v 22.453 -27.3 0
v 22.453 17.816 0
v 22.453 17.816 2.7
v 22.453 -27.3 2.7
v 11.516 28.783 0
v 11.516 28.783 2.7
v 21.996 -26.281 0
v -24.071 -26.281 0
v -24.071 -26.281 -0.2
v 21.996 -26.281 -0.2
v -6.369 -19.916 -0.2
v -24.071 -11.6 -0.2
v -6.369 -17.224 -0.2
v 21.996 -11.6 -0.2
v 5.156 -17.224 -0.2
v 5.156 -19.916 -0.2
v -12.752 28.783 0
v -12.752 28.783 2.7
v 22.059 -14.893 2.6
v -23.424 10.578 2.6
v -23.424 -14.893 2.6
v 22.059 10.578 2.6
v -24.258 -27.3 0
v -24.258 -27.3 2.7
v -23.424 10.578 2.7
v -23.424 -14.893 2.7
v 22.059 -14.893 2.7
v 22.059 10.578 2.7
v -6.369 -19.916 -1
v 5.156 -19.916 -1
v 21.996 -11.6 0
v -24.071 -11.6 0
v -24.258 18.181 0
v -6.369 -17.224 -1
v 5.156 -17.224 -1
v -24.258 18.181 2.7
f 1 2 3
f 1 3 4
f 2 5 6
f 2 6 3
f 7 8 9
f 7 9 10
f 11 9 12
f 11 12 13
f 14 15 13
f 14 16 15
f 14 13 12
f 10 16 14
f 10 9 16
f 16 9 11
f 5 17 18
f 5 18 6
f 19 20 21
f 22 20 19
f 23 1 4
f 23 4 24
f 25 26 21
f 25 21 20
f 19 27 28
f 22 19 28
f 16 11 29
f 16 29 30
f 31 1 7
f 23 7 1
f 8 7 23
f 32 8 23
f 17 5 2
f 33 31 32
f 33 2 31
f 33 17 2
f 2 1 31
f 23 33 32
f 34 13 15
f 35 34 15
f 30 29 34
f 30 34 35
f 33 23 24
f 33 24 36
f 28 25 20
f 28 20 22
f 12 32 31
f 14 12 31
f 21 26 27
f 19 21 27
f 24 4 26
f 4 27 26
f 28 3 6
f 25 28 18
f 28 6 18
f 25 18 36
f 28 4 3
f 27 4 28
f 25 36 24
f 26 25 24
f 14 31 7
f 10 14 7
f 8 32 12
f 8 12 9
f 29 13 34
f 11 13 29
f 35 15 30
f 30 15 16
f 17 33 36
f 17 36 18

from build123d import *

# Parameters (mm, degrees)
PAD023_DEPTH    = 2.7
SKETCH025_W     = 45.482226
SKETCH025_H     = 25.470864
POCKET004_DEPTH = 0.1
SKETCH026_W     = 11.525024
SKETCH026_H     = 2.6917
PAD024_DEPTH    = 1
SKETCH027_W     = 46.067685
SKETCH027_H     = 14.680909
PAD025_DEPTH    = 0.2


with BuildPart() as part:
    # Sketch024 → Pad023 (new body)
    with BuildSketch(Plane.XY):
        Polygon((-12.752221, 28.783382), (11.516397, 28.783382), (22.453339, 17.81637), (22.453339, -27.300421), (-24.258354, -27.300421), (-24.258354, 18.181068), align=None)
    extrude(amount=PAD023_DEPTH)

    # Sketch025 (on Face8 of Pad023) → Pocket004 (cut)
    with BuildSketch(Plane.XY.offset(2.7)):
        with Locations((-0.682435, -2.157326)):
            Rectangle(SKETCH025_W, SKETCH025_H)
    extrude(amount=-POCKET004_DEPTH, mode=Mode.SUBTRACT)

    # Sketch026 (on Face4 of Pocket004) → Pad024 (join)
    with BuildSketch(Plane(origin=(0, 0, 0), x_dir=(1, 0, 0), z_dir=(0, 0, -1))):
        with Locations((-0.606202, 18.569942)):
            Rectangle(SKETCH026_W, SKETCH026_H)
    extrude(amount=PAD024_DEPTH)

    # Sketch027 (on Face4 of Pad024) → Pad025 (join)
    with BuildSketch(Plane(origin=(0, 0, 0), x_dir=(1, 0, 0), z_dir=(0, 0, -1))):
        with Locations((-1.0373535, 18.9408465)):
            Rectangle(SKETCH027_W, SKETCH027_H)
    extrude(amount=PAD025_DEPTH)


solid = part.part
